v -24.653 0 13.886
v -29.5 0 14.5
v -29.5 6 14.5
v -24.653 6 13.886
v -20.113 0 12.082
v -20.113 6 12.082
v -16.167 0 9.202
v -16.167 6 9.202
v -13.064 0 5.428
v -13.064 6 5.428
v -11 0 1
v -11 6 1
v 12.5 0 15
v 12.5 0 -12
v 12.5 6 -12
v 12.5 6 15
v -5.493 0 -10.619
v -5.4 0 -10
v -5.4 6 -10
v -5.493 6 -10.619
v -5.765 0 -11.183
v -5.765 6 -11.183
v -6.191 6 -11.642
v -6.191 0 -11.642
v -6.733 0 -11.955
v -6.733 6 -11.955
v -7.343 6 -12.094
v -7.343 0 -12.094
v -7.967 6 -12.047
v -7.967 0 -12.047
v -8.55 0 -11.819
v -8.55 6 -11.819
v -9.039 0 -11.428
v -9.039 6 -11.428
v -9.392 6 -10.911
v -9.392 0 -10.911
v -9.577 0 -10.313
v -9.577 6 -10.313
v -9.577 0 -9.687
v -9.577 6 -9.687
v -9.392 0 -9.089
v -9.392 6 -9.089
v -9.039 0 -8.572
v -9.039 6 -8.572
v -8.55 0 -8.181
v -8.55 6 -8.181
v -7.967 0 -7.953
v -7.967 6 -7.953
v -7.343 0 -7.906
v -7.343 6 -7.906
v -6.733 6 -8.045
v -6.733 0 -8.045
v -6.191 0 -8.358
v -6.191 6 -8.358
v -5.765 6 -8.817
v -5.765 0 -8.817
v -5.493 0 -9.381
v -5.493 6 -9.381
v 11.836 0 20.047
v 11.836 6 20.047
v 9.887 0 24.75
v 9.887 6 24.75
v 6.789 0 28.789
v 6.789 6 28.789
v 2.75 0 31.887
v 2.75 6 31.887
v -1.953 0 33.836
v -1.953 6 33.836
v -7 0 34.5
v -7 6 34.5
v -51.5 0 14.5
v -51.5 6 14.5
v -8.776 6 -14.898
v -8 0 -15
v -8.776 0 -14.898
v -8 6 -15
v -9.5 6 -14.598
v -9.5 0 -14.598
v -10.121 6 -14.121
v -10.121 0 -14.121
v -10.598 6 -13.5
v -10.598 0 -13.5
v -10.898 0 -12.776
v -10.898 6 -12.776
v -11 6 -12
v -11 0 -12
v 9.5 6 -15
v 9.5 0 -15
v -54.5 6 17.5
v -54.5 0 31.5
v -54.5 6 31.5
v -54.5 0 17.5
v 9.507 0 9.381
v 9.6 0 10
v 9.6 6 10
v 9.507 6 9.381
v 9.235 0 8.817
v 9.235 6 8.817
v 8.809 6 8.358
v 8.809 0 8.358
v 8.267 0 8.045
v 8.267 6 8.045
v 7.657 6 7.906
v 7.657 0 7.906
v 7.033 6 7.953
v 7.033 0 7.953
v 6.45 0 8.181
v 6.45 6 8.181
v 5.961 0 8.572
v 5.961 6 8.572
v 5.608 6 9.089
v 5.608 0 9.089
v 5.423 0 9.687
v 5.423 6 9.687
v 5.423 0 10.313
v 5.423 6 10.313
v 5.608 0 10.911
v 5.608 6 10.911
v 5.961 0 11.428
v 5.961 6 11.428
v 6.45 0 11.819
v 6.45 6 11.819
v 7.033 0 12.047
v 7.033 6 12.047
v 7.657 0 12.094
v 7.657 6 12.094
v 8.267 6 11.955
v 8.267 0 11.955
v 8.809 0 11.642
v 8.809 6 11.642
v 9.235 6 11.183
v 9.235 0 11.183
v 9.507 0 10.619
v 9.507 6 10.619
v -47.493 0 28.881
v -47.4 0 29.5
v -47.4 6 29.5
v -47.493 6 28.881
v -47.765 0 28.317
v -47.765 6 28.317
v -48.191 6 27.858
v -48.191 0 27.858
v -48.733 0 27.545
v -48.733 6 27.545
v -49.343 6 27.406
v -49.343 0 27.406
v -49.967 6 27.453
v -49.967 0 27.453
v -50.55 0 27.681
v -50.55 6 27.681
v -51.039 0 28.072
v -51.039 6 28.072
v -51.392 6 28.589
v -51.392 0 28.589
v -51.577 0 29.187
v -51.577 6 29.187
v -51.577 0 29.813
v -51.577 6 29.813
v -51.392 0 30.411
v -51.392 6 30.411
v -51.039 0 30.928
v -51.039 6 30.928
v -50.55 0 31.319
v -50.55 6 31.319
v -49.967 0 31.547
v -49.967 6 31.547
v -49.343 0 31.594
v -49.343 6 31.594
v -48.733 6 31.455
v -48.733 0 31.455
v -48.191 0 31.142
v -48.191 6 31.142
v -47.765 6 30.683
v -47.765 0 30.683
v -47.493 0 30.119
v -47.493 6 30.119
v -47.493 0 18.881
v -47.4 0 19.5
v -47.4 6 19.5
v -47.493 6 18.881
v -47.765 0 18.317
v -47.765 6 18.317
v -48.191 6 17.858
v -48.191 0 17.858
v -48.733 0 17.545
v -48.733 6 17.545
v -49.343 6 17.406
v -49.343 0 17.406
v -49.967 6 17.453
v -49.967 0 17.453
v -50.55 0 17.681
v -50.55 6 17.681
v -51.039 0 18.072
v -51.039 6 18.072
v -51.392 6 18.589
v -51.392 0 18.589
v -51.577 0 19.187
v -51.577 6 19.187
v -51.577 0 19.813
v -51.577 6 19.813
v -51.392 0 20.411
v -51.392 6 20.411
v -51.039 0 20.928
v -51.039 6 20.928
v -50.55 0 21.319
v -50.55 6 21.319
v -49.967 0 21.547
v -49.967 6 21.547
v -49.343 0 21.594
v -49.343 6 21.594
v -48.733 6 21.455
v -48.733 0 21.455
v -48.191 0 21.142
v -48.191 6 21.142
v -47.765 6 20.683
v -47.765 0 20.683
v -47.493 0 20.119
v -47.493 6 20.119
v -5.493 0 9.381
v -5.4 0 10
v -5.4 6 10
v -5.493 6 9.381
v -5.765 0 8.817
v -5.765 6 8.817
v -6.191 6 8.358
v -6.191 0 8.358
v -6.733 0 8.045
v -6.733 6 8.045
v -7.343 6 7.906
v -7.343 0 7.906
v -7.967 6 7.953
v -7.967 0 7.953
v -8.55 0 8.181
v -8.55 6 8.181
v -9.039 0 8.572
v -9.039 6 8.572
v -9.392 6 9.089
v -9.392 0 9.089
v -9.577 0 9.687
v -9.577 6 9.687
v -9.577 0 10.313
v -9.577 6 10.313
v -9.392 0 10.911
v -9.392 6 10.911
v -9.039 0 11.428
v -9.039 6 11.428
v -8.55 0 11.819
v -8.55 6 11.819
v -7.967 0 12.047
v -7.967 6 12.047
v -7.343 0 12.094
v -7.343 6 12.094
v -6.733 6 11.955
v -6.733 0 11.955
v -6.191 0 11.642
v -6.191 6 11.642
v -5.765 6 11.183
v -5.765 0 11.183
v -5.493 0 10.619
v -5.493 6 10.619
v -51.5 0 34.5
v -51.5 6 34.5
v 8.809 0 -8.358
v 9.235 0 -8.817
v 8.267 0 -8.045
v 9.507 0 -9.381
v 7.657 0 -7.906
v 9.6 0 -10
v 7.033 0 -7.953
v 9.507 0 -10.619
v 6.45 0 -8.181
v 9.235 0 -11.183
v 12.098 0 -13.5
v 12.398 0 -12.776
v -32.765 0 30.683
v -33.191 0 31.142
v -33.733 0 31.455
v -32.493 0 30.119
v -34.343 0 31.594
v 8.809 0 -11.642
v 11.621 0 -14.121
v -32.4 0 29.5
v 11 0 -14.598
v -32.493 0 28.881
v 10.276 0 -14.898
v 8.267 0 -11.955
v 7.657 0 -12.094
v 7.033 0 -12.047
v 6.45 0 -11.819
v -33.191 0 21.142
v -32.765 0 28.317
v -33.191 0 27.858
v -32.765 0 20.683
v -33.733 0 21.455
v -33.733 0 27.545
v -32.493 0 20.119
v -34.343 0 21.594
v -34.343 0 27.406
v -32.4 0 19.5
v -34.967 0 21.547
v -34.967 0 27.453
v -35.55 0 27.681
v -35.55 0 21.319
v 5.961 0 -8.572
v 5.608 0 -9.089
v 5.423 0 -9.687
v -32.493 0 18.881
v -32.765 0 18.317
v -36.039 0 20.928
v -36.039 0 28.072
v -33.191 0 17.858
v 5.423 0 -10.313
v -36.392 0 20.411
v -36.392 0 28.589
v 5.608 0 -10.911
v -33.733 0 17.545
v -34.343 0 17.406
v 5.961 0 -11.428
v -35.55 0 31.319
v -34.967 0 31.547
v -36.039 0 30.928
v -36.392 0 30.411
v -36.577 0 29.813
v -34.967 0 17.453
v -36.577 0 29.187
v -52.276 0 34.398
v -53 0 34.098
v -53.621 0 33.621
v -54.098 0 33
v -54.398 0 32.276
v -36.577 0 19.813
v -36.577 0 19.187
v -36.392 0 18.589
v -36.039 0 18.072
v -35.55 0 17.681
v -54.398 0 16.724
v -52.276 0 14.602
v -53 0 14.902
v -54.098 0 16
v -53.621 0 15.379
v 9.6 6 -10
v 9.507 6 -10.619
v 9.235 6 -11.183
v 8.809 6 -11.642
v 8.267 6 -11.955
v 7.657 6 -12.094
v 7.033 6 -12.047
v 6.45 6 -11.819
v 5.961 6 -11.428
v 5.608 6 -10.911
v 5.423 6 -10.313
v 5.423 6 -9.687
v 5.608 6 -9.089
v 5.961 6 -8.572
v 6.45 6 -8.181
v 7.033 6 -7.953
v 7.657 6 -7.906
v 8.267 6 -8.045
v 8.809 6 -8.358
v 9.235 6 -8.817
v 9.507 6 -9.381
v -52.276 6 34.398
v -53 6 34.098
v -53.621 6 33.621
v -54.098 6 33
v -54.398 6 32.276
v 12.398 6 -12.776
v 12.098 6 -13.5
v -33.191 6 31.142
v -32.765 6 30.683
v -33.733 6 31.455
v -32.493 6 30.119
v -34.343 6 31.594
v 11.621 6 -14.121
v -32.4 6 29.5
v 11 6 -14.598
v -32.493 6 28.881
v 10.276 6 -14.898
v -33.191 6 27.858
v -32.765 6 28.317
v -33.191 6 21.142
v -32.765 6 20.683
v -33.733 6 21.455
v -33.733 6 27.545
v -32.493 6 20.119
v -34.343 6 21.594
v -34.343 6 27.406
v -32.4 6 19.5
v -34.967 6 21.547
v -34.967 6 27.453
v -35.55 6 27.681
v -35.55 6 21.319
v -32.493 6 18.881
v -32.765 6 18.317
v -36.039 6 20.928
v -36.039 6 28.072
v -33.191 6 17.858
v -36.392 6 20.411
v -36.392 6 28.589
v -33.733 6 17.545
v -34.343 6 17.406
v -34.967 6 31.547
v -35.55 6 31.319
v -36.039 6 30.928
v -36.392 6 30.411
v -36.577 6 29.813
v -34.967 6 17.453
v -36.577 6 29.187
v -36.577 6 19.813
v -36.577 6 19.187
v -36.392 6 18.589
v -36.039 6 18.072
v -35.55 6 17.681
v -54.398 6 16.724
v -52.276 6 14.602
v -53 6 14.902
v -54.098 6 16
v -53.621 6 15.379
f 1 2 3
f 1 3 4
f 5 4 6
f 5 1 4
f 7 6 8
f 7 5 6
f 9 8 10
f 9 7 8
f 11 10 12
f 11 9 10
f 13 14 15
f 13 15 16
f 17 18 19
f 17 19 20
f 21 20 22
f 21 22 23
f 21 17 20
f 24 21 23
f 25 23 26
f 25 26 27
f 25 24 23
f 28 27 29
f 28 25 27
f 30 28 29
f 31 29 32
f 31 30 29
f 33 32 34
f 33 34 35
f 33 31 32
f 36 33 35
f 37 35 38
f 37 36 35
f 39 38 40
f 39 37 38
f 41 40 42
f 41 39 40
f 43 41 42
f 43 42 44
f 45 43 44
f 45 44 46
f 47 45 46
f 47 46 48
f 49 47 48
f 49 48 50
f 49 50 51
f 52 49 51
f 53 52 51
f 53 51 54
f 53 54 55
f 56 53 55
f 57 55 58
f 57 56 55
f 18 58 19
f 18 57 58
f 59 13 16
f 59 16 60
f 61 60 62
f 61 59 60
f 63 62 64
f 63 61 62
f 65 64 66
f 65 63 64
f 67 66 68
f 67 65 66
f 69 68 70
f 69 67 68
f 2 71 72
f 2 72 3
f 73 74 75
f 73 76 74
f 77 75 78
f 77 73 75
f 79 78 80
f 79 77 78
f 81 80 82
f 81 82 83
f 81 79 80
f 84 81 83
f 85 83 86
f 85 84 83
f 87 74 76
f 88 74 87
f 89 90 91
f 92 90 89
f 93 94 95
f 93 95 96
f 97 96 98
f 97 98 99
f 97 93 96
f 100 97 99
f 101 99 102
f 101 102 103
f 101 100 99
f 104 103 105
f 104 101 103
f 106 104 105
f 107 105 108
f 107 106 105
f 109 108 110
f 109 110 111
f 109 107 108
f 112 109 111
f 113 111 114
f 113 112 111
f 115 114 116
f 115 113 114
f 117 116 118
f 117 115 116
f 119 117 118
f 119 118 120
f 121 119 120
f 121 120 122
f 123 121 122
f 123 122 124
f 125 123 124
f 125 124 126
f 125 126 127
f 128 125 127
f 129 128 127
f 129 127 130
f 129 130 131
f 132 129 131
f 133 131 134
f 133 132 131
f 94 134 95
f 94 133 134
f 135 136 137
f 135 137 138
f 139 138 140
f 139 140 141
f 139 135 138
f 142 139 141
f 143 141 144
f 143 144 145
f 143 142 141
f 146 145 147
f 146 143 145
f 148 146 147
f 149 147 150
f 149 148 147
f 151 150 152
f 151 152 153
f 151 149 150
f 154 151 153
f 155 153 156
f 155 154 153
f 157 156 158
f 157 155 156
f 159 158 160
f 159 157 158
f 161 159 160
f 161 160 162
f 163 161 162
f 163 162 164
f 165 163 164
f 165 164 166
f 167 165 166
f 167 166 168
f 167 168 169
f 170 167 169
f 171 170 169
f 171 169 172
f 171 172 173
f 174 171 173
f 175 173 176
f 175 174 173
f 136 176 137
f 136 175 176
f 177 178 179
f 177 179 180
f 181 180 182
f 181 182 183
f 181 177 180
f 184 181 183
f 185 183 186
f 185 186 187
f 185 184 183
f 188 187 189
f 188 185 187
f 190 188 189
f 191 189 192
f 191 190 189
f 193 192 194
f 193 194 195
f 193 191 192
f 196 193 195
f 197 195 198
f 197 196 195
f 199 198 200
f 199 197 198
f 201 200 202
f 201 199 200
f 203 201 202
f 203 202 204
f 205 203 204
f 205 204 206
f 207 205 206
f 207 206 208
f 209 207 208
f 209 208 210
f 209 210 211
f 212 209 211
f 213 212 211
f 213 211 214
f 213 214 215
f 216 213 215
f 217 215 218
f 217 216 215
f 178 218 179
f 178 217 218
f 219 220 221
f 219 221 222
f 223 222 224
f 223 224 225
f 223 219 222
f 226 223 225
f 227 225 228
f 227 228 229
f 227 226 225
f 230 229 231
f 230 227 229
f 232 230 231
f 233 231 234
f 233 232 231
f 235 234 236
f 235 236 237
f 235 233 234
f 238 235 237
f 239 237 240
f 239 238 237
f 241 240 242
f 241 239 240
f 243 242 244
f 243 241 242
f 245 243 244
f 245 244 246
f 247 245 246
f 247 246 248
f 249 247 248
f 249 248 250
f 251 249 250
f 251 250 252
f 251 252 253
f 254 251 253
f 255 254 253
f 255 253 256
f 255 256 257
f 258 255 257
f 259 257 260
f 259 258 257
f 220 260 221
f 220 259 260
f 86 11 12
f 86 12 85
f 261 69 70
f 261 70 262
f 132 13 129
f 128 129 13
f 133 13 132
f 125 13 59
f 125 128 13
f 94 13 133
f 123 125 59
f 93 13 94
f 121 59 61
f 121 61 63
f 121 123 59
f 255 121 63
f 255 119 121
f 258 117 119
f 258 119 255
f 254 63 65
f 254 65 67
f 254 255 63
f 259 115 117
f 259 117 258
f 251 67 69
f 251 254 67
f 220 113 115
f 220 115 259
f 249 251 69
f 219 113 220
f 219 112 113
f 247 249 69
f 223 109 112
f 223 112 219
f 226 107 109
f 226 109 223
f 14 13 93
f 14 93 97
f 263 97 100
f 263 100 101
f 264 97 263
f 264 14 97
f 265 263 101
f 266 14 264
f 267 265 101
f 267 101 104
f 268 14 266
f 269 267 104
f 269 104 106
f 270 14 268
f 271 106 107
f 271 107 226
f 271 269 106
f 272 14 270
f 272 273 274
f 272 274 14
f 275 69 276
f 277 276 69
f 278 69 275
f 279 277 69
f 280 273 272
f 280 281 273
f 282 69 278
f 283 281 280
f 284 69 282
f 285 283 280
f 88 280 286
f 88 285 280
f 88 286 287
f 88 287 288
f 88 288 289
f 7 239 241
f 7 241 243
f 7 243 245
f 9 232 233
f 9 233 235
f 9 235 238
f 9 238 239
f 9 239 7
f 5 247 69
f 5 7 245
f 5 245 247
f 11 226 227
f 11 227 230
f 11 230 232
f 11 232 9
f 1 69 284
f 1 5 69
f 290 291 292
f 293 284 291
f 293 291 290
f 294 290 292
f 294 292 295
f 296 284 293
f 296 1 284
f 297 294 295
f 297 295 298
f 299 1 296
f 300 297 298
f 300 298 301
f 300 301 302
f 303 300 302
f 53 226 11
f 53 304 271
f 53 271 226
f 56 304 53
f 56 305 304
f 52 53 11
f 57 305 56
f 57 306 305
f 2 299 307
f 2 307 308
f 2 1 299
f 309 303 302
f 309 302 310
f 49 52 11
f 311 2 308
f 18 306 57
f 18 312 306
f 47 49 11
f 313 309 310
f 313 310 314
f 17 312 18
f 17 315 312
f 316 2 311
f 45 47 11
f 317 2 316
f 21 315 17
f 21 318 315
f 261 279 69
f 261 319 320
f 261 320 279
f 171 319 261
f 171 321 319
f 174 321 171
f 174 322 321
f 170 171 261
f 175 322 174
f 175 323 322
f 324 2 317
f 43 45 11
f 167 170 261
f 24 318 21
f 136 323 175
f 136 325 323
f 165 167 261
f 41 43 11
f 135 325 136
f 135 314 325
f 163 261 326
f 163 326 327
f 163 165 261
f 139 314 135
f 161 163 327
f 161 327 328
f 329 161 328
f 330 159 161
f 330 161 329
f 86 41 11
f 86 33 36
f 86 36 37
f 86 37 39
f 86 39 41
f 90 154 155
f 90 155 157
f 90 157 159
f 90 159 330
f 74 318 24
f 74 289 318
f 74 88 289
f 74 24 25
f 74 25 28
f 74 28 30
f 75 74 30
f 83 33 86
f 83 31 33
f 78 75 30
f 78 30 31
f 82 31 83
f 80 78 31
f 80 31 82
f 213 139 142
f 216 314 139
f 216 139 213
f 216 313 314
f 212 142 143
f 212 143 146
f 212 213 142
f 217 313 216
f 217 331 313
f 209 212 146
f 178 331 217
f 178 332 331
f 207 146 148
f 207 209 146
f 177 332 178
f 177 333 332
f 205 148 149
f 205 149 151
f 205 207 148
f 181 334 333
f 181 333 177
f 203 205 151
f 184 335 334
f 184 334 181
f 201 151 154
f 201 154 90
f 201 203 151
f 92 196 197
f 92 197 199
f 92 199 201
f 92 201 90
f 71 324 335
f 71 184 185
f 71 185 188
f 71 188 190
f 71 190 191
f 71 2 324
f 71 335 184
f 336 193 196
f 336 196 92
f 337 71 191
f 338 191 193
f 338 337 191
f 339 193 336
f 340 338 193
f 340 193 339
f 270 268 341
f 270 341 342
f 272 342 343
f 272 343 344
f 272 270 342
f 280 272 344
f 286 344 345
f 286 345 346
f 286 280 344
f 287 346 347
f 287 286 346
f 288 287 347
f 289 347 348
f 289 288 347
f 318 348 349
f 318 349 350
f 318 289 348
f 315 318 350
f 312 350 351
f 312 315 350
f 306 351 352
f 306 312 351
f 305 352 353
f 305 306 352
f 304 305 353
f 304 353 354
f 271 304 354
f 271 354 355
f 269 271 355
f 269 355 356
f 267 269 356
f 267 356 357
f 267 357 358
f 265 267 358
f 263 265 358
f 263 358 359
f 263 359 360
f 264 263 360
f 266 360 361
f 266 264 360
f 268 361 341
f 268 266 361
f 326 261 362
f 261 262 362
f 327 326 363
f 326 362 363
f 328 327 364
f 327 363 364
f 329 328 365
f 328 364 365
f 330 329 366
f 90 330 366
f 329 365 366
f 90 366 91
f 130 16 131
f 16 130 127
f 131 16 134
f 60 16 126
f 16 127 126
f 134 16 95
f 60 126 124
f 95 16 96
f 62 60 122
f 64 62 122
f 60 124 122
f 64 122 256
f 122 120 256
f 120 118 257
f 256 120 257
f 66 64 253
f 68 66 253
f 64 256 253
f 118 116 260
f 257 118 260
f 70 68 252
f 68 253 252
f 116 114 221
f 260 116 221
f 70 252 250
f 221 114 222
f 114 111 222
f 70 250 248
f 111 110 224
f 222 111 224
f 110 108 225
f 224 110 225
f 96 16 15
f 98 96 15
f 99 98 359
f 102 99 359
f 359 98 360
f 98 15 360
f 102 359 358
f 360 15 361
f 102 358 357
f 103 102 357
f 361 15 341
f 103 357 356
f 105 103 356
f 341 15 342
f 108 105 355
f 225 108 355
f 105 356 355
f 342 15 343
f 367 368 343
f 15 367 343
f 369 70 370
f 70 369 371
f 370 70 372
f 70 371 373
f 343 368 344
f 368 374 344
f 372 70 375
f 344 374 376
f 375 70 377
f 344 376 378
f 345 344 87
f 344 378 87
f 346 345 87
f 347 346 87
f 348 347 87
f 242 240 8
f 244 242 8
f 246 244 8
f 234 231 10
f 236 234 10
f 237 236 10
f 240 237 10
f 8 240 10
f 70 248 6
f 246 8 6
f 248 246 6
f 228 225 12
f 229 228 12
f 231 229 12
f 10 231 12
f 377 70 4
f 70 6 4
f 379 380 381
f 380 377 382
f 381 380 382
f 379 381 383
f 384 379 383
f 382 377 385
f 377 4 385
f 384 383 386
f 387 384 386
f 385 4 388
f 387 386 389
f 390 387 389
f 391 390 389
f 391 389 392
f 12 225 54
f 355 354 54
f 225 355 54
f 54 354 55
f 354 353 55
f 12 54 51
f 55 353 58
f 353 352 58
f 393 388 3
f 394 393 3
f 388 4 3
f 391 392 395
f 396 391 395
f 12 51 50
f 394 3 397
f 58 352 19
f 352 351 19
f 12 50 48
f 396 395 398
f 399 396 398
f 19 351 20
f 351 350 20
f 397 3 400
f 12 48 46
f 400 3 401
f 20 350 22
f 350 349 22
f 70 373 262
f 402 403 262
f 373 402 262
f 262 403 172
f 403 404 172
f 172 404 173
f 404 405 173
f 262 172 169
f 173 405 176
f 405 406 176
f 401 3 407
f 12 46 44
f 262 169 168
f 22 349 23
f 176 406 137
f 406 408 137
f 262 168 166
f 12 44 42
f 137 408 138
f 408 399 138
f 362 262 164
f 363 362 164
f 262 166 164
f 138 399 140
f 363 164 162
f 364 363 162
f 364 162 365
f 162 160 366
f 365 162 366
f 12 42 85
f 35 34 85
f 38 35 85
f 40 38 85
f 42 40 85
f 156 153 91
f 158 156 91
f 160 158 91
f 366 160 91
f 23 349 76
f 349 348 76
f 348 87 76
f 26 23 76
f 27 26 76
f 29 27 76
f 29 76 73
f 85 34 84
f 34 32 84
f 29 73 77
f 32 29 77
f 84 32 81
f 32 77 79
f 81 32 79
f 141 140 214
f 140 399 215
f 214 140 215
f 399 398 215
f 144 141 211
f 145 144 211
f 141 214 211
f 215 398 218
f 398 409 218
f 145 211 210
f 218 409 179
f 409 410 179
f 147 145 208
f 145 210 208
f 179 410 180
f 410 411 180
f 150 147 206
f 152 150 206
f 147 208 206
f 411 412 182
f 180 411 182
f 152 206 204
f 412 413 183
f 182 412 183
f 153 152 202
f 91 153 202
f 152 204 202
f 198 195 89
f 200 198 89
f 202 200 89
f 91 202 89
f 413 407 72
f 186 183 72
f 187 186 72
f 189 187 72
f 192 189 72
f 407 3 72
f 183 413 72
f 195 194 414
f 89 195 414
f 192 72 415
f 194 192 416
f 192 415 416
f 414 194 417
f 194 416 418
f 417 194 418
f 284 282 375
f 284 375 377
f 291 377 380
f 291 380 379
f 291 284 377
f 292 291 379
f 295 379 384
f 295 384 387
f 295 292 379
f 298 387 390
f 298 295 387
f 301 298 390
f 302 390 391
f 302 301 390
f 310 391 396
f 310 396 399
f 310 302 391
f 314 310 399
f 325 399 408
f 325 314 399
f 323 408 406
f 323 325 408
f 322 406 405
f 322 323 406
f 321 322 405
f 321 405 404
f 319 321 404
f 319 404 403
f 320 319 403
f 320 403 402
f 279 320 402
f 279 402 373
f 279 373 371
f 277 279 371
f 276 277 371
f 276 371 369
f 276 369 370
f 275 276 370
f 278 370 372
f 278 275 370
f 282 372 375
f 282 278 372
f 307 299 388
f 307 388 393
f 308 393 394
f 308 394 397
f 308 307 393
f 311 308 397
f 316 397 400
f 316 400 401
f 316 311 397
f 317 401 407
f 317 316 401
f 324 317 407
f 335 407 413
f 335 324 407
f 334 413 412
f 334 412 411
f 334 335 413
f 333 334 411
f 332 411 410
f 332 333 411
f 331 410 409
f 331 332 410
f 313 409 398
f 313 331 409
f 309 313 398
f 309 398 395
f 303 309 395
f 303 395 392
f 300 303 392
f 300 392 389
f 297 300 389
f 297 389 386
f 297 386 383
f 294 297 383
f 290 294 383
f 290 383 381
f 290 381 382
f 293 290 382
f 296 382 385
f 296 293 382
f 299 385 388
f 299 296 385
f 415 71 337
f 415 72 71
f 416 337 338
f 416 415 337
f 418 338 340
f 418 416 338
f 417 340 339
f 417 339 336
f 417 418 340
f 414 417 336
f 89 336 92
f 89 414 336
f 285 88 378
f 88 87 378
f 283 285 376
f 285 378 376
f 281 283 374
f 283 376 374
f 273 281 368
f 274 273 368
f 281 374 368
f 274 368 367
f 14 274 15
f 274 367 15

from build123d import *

# Parameters (mm, degrees)
SKETCH_1_R      = 2.1
EXTRUDE_1_DEPTH = 6
FILLET_1_R      = 3


with BuildPart() as part:
    # 草图1 → 凸台-拉伸1 (new body)
    with BuildSketch(Plane(origin=(0, 0, 0), x_dir=(1, 0, 0), z_dir=(0, 1, 0))):
        with BuildLine():
            Line((-11, 15), (12.5, 15))
            Line((12.5, 15), (12.5, -15))
            ThreePointArc((12.5, -15), (6.788582233, -28.788582233), (-7, -34.5))
            Line((-7, -34.5), (-54.5, -34.5))
            Line((-54.5, -34.5), (-54.5, -14.5))
            Line((-54.5, -14.5), (-29.5, -14.5))
            ThreePointArc((-29.5, -14.5), (-18.049017509, -10.766161191), (-11, -1))
            Line((-11, -1), (-11, 15))
        make_face()
        with Locations((-49.5, -19.5)):
            Circle(SKETCH_1_R, mode=Mode.SUBTRACT)
        with Locations((-7.5, -10)):
            Circle(SKETCH_1_R, mode=Mode.SUBTRACT)
        with Locations((-34.5, -19.5)):
            Circle(SKETCH_1_R, mode=Mode.SUBTRACT)
        with Locations((-34.5, -29.5)):
            Circle(SKETCH_1_R, mode=Mode.SUBTRACT)
        with Locations((-49.5, -29.5)):
            Circle(SKETCH_1_R, mode=Mode.SUBTRACT)
        with Locations((7.5, -10)):
            Circle(SKETCH_1_R, mode=Mode.SUBTRACT)
        with Locations((7.5, 10)):
            Circle(SKETCH_1_R, mode=Mode.SUBTRACT)
        with Locations((-7.5, 10)):
            Circle(SKETCH_1_R, mode=Mode.SUBTRACT)
    extrude(amount=EXTRUDE_1_DEPTH)

    # 圆角1
    fillet_1_edges = [part.edges().sort_by_distance(p)[0] for p in [
        (-11, 3, -15),
        (12.5, 3, -15),
        (-54.5, 3, 34.5),
        (-54.5, 3, 14.5),
    ]]
    fillet(fillet_1_edges, radius=FILLET_1_R)


solid = part.part
